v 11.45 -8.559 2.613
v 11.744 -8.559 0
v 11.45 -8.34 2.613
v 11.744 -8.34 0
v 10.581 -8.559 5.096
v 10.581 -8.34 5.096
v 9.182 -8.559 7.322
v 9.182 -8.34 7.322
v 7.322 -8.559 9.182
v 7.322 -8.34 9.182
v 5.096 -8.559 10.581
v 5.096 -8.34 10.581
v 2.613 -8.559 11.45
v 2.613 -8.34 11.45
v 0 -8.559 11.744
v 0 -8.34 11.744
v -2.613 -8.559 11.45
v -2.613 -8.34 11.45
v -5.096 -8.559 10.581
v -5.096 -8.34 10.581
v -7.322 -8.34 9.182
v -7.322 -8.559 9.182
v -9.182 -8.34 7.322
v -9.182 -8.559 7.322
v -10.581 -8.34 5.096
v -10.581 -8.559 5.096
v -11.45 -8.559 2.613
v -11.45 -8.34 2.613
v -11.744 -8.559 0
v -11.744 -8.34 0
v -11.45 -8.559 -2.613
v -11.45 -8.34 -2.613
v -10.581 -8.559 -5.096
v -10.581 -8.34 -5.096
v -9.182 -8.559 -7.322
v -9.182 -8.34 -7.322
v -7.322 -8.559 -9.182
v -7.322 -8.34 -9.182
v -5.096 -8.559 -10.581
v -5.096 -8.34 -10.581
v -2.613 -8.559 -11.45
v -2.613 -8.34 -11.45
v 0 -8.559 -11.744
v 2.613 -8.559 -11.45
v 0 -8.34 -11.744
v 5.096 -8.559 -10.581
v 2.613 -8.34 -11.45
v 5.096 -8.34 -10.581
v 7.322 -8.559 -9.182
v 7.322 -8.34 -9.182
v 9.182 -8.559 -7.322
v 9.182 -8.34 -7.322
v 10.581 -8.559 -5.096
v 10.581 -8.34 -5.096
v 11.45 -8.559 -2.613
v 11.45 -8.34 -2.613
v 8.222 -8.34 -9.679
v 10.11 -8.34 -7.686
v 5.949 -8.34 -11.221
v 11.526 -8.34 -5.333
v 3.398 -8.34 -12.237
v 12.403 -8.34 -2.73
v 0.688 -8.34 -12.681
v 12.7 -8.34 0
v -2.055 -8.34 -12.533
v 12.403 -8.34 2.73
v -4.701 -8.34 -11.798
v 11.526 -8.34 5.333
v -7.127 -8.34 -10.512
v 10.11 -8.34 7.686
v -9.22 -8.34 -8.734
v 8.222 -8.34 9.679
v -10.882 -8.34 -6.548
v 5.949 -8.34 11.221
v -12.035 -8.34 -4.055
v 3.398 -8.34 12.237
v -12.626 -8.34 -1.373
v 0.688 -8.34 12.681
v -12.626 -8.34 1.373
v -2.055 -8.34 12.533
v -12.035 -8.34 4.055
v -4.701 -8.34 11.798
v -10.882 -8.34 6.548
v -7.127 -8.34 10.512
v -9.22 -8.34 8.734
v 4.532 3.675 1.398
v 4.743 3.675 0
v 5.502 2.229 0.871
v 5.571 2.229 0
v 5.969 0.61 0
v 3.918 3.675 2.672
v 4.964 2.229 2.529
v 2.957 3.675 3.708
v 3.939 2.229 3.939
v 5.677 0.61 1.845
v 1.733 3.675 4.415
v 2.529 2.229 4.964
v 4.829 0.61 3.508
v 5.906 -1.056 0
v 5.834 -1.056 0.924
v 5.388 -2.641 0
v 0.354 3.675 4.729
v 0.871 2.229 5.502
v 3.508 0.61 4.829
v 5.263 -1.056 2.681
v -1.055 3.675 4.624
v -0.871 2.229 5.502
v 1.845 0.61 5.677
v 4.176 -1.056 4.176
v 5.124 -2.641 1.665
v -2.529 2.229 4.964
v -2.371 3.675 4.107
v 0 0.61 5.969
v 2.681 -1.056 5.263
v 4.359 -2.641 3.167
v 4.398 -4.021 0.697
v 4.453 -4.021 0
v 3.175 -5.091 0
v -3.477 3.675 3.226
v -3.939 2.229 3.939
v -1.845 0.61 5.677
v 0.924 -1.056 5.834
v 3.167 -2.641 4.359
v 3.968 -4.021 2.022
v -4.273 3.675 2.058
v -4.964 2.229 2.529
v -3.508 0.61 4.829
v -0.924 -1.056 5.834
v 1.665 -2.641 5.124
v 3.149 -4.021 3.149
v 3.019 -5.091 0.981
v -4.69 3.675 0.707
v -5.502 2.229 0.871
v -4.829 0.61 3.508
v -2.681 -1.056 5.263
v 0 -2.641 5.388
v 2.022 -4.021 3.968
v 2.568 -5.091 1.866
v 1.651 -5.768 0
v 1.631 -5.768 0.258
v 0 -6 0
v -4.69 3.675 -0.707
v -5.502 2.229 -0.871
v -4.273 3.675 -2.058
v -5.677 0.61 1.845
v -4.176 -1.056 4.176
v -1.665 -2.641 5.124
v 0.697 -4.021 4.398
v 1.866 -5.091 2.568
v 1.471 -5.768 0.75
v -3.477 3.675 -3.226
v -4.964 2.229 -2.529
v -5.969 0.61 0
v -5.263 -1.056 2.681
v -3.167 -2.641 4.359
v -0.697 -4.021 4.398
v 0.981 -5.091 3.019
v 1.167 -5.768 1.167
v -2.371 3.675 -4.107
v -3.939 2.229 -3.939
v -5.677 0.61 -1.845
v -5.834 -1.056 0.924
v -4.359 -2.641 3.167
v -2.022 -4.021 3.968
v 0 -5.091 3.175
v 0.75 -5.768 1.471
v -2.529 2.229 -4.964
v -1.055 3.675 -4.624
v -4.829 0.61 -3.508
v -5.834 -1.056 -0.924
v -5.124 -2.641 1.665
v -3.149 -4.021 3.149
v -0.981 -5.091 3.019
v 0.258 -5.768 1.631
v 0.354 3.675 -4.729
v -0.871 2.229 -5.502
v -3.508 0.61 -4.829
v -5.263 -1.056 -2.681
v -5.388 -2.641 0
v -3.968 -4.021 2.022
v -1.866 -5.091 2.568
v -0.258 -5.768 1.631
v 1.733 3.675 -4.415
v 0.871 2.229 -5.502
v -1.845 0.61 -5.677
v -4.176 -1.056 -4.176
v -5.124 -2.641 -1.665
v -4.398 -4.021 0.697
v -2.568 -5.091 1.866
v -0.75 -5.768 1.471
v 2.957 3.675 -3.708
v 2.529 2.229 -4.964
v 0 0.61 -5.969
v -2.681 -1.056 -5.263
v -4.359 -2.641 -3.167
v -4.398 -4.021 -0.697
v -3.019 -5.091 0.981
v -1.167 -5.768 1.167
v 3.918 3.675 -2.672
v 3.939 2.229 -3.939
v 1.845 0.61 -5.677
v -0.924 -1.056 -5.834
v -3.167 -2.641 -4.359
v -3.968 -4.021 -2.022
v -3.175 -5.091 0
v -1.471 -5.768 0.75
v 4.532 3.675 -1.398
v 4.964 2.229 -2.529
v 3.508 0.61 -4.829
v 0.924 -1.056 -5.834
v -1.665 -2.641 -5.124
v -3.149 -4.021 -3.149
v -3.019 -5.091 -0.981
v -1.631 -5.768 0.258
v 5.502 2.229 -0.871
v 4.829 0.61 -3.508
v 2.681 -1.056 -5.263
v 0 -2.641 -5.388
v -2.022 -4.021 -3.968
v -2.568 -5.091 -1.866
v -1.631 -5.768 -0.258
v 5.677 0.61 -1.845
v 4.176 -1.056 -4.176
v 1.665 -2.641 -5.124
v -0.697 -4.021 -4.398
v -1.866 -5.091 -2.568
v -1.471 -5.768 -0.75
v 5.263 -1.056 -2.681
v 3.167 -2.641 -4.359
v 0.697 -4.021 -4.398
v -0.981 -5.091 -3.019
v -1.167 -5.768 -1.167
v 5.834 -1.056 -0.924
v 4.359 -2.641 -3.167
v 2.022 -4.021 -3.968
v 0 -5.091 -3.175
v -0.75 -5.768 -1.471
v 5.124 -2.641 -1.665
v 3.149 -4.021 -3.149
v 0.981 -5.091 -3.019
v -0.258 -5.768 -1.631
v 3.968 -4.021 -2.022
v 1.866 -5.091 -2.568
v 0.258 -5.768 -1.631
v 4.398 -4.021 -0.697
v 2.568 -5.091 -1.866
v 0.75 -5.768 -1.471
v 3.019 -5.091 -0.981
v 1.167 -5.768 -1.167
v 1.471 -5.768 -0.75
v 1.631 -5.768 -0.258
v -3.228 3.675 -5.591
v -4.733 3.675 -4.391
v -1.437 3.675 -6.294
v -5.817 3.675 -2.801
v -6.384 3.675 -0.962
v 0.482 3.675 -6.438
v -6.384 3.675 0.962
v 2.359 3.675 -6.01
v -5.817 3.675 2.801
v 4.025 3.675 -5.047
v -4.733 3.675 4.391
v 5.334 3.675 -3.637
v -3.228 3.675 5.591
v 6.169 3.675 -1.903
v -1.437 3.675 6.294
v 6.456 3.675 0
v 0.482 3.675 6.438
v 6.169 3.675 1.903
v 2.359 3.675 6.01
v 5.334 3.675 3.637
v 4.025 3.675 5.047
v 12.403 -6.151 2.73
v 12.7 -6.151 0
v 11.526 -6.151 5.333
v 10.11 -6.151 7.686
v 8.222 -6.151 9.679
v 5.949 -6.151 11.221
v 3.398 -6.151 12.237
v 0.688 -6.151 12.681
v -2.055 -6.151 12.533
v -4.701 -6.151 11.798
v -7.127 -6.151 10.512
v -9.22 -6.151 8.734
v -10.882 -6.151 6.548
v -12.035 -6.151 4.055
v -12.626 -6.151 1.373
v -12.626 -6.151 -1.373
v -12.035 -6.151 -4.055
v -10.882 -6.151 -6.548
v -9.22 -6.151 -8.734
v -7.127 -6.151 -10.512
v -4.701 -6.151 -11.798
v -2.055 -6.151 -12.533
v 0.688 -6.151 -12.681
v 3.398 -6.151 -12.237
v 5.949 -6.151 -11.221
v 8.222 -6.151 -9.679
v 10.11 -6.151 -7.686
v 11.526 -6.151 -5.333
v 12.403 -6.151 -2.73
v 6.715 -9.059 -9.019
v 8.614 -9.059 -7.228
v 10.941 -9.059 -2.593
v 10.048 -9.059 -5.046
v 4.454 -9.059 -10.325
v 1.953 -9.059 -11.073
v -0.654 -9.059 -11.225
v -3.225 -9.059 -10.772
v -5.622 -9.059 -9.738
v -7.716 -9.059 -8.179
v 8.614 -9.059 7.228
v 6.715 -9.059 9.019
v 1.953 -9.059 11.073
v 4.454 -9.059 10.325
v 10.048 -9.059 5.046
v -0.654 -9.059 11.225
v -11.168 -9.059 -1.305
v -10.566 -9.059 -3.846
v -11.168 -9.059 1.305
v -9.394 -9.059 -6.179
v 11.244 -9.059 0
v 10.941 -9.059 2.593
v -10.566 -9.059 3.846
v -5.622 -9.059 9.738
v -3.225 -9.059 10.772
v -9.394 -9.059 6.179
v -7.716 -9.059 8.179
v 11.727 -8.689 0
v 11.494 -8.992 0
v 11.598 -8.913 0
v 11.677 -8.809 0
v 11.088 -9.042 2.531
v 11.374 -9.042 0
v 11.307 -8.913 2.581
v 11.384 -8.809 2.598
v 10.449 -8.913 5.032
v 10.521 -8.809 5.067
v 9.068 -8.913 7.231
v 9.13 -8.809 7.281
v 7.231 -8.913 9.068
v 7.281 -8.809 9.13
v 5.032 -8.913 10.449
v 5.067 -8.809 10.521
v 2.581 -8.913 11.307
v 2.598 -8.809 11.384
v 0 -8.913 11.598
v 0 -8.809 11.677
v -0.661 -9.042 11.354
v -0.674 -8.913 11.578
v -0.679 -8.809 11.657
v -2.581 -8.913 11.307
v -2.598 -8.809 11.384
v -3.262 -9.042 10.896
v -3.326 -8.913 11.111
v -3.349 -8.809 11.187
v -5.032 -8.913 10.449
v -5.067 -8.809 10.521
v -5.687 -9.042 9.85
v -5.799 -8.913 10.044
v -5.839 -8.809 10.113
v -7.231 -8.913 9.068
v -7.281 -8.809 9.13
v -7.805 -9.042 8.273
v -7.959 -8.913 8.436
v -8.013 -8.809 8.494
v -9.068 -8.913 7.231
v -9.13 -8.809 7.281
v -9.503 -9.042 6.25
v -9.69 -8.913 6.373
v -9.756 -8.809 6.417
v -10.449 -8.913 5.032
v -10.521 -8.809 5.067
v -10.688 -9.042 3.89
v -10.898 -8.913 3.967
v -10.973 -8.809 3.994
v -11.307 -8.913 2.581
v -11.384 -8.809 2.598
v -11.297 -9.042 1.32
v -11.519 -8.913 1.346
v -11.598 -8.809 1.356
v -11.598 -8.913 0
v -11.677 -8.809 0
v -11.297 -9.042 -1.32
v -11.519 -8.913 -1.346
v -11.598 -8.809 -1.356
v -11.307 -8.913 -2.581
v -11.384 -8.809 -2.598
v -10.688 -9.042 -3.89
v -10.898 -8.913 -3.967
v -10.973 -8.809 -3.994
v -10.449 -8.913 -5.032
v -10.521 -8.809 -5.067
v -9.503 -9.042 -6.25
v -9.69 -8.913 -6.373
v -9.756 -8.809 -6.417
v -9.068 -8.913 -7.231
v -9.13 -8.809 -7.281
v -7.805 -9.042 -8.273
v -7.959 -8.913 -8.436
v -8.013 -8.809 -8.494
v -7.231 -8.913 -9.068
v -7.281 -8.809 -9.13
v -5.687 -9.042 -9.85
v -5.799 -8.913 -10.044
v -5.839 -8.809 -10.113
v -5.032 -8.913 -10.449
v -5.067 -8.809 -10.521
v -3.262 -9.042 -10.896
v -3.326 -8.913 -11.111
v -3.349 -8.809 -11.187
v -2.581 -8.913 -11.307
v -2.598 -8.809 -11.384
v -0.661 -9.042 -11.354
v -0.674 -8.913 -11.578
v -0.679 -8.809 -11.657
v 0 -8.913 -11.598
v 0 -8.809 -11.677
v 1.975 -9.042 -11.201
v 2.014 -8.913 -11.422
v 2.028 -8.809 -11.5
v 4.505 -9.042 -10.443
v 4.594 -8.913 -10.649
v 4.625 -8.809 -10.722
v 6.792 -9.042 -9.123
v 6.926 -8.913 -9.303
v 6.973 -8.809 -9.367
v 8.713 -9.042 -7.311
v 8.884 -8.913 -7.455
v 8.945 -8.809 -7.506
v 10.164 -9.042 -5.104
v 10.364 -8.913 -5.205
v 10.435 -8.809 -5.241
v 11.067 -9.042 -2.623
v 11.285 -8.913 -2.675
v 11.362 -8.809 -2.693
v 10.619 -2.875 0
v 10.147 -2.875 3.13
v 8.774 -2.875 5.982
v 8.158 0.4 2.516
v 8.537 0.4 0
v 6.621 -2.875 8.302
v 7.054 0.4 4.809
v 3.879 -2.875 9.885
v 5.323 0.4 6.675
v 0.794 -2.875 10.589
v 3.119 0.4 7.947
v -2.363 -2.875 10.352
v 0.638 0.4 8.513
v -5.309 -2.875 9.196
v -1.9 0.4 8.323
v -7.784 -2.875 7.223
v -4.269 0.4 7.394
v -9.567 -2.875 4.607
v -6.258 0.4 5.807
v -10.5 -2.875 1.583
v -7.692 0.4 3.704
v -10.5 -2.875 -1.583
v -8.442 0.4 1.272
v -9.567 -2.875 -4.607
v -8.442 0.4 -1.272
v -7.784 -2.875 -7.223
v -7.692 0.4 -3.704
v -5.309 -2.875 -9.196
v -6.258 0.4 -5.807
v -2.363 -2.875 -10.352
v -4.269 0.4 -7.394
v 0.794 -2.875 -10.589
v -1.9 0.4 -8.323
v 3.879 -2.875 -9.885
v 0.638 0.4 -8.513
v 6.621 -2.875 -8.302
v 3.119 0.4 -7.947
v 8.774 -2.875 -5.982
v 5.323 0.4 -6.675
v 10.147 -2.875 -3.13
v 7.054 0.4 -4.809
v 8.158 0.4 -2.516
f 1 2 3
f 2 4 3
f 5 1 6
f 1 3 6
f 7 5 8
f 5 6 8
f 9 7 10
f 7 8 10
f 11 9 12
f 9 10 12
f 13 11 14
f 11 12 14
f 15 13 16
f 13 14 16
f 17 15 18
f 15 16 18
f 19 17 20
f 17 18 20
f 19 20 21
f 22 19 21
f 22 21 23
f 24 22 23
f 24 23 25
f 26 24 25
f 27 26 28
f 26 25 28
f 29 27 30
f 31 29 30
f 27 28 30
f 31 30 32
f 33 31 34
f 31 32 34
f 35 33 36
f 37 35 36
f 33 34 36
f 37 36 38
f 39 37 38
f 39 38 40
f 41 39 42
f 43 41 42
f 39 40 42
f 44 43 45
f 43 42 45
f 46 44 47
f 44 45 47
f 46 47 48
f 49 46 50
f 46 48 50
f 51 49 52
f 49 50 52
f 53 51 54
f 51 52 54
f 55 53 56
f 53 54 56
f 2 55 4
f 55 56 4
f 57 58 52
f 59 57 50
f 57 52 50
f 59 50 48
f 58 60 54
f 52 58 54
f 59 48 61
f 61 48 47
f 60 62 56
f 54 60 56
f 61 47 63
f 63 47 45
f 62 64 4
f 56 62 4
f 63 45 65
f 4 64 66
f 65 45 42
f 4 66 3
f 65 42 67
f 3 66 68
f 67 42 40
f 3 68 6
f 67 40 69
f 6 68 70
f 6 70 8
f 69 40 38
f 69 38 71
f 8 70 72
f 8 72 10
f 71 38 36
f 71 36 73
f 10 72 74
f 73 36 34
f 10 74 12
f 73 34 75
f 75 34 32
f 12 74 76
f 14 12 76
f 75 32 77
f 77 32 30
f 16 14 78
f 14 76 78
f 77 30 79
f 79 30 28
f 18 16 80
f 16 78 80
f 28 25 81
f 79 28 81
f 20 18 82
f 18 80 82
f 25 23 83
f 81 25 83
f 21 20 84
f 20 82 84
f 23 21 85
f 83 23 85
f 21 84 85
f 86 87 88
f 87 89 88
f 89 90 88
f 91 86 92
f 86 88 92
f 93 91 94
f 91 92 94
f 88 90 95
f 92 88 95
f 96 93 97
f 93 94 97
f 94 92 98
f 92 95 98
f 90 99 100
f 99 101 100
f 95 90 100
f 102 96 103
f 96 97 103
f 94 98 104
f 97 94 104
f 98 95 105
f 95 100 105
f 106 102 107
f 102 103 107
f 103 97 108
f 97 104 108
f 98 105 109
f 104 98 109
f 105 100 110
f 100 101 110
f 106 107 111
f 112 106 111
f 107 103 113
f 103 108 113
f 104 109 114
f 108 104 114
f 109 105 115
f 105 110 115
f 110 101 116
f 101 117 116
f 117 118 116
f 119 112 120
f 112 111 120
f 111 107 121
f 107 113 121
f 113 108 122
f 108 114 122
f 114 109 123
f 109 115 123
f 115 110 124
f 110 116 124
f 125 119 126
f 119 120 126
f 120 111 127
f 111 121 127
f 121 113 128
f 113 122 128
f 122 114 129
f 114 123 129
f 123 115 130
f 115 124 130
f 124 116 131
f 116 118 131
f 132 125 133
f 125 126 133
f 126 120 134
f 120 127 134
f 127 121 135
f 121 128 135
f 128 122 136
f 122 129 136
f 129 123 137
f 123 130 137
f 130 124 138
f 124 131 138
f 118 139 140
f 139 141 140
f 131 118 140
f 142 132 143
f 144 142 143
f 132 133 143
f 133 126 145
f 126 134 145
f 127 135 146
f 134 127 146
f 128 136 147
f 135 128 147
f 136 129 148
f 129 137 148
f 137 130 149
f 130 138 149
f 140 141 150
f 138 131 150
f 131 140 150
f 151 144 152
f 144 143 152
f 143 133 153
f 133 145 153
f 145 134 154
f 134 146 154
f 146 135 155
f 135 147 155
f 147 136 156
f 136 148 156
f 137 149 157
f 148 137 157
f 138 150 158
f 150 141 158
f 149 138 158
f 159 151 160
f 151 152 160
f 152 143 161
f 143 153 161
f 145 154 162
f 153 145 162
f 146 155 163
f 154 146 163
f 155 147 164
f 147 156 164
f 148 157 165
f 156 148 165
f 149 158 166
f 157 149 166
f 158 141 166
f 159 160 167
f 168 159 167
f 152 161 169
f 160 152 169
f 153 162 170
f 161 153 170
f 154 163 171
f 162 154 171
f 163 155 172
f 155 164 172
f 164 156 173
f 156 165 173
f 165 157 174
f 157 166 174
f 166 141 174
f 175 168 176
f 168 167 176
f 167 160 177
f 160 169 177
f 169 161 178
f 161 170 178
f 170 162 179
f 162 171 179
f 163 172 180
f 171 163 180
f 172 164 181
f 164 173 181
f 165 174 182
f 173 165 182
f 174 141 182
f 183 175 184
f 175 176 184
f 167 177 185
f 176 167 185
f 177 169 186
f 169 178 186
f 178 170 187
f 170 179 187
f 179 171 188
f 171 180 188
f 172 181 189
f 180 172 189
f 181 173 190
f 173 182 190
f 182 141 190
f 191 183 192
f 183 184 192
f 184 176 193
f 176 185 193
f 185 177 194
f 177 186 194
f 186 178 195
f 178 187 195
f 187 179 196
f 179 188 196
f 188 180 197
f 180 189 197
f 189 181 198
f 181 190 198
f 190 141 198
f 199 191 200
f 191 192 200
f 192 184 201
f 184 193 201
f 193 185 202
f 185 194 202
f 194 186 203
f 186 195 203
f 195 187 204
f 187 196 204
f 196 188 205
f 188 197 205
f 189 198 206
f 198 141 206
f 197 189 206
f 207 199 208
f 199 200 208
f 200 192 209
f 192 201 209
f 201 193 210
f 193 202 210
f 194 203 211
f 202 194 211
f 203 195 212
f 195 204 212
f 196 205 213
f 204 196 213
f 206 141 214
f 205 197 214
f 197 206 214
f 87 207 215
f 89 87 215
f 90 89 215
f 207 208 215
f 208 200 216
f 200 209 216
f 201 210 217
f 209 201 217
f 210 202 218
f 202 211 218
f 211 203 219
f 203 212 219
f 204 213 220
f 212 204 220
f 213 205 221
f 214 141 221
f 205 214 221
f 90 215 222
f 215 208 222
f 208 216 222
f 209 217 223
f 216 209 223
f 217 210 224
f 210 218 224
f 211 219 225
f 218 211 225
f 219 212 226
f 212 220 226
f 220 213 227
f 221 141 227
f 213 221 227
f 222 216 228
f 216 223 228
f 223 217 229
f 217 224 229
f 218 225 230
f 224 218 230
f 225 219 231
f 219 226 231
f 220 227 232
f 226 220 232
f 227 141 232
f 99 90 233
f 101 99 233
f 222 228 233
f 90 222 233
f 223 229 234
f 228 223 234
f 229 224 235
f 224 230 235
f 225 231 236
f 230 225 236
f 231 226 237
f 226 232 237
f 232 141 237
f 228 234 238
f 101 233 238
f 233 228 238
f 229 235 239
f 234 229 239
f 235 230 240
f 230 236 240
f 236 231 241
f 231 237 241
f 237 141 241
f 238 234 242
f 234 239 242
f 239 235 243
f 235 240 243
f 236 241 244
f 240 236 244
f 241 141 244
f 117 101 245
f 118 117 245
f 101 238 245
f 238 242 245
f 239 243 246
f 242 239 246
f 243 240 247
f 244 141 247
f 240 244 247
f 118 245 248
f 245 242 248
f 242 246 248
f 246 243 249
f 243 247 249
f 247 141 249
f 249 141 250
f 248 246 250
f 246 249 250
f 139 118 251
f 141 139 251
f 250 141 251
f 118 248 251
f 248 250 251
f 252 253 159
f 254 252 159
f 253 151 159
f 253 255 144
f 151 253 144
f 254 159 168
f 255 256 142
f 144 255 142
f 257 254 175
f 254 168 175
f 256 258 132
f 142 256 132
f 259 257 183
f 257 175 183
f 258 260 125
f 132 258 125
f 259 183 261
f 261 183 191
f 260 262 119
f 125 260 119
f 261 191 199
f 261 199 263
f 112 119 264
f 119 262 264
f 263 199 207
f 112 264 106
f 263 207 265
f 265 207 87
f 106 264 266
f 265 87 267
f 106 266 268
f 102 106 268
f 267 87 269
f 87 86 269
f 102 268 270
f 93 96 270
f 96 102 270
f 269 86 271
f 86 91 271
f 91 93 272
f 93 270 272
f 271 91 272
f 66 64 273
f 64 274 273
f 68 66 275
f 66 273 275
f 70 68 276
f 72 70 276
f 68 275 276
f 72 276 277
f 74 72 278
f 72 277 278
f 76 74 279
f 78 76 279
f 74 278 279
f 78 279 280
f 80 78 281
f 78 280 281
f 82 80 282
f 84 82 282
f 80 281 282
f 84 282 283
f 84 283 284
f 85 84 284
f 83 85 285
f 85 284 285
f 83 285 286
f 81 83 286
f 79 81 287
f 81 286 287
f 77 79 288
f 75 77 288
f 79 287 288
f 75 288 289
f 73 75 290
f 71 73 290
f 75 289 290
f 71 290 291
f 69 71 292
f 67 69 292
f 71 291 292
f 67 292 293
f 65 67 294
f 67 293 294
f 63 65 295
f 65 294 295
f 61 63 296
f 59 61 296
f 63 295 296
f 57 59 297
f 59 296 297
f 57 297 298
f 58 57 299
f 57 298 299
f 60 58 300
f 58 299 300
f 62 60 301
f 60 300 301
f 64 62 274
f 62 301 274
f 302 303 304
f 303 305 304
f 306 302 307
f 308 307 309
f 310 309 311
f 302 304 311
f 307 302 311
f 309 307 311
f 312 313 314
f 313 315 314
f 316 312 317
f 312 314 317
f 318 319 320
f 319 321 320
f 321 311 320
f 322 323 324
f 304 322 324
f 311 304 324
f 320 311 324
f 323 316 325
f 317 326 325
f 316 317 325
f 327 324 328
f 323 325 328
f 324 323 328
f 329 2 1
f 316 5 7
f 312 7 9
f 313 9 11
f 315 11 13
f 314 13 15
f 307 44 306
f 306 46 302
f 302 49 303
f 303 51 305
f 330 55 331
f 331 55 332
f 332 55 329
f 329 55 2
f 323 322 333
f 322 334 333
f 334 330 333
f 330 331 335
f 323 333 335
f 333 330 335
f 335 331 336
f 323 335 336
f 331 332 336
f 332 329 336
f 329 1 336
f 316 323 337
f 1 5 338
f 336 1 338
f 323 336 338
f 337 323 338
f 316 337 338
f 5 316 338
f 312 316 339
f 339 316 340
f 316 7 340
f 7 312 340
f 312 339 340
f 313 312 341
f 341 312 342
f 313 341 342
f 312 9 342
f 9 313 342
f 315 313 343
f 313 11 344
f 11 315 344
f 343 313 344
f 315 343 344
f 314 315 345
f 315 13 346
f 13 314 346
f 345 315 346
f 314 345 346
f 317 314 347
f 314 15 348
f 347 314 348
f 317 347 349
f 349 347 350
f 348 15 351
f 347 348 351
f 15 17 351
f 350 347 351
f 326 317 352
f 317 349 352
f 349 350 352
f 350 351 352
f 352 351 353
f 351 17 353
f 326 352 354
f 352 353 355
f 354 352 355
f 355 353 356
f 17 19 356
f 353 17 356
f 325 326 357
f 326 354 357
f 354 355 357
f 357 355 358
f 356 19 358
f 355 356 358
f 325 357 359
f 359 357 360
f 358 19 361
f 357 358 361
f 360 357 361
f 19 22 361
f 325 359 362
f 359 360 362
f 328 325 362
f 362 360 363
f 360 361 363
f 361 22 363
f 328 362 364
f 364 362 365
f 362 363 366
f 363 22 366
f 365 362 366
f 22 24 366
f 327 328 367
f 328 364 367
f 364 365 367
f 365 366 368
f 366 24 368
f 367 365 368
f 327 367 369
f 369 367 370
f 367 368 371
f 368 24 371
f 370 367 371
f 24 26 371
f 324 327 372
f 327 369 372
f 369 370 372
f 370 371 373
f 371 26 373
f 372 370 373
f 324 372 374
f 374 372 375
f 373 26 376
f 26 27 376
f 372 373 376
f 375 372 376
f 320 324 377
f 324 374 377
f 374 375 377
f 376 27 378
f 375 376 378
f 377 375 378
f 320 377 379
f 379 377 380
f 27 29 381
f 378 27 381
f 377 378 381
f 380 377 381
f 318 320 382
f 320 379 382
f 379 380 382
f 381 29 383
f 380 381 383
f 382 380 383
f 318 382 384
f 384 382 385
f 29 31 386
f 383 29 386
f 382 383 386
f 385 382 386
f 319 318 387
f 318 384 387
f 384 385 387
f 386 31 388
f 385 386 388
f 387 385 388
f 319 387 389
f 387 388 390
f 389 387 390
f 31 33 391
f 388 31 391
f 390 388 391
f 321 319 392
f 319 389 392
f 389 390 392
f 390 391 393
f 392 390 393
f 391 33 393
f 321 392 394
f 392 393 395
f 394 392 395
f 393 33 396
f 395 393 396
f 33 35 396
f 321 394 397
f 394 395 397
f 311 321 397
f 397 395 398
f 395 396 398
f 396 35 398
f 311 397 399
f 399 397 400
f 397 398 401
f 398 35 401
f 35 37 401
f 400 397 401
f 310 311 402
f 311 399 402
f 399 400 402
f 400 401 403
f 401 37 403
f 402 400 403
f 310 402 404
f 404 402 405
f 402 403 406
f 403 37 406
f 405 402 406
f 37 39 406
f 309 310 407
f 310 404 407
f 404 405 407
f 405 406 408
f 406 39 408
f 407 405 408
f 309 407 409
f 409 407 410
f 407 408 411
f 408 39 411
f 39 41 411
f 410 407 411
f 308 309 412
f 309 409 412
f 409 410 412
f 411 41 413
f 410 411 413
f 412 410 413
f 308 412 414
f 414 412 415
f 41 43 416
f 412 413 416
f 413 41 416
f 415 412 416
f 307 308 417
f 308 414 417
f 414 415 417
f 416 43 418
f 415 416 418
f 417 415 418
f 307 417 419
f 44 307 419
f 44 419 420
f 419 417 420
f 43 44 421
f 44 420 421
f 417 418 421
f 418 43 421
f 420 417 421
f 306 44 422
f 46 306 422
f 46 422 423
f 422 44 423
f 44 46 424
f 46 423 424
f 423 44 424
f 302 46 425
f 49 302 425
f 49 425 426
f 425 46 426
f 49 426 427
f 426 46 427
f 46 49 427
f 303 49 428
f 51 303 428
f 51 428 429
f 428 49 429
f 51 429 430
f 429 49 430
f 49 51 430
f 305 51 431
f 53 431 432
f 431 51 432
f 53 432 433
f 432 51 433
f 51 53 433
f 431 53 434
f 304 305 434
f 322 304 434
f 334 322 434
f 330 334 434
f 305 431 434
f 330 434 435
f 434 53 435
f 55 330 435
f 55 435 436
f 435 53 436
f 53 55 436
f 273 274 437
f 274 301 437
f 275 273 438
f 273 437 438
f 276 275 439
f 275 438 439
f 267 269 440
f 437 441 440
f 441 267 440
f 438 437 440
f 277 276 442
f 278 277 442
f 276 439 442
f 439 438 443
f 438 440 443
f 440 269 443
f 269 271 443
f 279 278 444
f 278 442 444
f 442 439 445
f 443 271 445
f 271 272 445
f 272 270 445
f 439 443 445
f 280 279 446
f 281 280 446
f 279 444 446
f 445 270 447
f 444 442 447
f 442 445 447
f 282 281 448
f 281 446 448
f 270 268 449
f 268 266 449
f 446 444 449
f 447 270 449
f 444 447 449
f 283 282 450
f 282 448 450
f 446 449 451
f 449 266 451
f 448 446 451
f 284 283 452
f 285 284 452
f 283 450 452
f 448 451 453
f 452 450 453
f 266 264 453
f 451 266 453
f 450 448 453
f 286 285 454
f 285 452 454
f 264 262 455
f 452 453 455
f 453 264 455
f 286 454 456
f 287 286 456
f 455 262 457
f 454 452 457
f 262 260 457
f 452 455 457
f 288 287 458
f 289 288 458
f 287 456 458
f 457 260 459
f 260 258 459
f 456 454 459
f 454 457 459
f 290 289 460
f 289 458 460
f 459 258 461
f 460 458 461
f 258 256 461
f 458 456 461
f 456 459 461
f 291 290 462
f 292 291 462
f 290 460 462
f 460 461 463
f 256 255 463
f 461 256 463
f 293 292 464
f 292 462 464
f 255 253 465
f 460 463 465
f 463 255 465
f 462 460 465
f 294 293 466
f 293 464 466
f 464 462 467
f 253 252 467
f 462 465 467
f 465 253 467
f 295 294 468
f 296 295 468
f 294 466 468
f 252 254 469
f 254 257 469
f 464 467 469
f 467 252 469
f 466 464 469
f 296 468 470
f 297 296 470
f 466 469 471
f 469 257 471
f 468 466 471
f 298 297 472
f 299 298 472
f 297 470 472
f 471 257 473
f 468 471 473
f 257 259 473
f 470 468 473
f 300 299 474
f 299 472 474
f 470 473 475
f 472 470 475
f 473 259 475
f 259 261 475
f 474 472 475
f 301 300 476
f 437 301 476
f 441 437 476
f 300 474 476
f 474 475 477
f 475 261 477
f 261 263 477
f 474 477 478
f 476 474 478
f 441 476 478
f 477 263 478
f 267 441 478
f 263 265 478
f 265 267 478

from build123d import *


with BuildPart() as part:
    # Sketch1 → Revolve1 (revolve)
    with BuildSketch(Plane.XY):
        with BuildLine():
            Line((12.7, -6.150685179), (6.455964927, 3.675363757))
            Line((6.455964927, 3.675363757), (4.742541645, 3.675363757))
            ThreePointArc((4.742541645, 3.675363757), (5.387586776, -2.640815921), (0, -6))
            Line((0, -6), (0, -9.059401987))
            Line((0, -9.059401987), (11.244226909, -9.059401987))
            ThreePointArc((11.244226909, -9.059401987), (11.5977803, -8.912955378), (11.744226909, -8.559401987))
            Line((11.744226909, -8.559401987), (11.744226909, -8.340026624))
            Line((11.744226909, -8.340026624), (12.7, -8.340026624))
            Line((12.7, -8.340026624), (12.7, -6.150685179))
        make_face()
    revolve(axis=Axis((0, 0, 0), (0, -1, 0)))


solid = part.part
